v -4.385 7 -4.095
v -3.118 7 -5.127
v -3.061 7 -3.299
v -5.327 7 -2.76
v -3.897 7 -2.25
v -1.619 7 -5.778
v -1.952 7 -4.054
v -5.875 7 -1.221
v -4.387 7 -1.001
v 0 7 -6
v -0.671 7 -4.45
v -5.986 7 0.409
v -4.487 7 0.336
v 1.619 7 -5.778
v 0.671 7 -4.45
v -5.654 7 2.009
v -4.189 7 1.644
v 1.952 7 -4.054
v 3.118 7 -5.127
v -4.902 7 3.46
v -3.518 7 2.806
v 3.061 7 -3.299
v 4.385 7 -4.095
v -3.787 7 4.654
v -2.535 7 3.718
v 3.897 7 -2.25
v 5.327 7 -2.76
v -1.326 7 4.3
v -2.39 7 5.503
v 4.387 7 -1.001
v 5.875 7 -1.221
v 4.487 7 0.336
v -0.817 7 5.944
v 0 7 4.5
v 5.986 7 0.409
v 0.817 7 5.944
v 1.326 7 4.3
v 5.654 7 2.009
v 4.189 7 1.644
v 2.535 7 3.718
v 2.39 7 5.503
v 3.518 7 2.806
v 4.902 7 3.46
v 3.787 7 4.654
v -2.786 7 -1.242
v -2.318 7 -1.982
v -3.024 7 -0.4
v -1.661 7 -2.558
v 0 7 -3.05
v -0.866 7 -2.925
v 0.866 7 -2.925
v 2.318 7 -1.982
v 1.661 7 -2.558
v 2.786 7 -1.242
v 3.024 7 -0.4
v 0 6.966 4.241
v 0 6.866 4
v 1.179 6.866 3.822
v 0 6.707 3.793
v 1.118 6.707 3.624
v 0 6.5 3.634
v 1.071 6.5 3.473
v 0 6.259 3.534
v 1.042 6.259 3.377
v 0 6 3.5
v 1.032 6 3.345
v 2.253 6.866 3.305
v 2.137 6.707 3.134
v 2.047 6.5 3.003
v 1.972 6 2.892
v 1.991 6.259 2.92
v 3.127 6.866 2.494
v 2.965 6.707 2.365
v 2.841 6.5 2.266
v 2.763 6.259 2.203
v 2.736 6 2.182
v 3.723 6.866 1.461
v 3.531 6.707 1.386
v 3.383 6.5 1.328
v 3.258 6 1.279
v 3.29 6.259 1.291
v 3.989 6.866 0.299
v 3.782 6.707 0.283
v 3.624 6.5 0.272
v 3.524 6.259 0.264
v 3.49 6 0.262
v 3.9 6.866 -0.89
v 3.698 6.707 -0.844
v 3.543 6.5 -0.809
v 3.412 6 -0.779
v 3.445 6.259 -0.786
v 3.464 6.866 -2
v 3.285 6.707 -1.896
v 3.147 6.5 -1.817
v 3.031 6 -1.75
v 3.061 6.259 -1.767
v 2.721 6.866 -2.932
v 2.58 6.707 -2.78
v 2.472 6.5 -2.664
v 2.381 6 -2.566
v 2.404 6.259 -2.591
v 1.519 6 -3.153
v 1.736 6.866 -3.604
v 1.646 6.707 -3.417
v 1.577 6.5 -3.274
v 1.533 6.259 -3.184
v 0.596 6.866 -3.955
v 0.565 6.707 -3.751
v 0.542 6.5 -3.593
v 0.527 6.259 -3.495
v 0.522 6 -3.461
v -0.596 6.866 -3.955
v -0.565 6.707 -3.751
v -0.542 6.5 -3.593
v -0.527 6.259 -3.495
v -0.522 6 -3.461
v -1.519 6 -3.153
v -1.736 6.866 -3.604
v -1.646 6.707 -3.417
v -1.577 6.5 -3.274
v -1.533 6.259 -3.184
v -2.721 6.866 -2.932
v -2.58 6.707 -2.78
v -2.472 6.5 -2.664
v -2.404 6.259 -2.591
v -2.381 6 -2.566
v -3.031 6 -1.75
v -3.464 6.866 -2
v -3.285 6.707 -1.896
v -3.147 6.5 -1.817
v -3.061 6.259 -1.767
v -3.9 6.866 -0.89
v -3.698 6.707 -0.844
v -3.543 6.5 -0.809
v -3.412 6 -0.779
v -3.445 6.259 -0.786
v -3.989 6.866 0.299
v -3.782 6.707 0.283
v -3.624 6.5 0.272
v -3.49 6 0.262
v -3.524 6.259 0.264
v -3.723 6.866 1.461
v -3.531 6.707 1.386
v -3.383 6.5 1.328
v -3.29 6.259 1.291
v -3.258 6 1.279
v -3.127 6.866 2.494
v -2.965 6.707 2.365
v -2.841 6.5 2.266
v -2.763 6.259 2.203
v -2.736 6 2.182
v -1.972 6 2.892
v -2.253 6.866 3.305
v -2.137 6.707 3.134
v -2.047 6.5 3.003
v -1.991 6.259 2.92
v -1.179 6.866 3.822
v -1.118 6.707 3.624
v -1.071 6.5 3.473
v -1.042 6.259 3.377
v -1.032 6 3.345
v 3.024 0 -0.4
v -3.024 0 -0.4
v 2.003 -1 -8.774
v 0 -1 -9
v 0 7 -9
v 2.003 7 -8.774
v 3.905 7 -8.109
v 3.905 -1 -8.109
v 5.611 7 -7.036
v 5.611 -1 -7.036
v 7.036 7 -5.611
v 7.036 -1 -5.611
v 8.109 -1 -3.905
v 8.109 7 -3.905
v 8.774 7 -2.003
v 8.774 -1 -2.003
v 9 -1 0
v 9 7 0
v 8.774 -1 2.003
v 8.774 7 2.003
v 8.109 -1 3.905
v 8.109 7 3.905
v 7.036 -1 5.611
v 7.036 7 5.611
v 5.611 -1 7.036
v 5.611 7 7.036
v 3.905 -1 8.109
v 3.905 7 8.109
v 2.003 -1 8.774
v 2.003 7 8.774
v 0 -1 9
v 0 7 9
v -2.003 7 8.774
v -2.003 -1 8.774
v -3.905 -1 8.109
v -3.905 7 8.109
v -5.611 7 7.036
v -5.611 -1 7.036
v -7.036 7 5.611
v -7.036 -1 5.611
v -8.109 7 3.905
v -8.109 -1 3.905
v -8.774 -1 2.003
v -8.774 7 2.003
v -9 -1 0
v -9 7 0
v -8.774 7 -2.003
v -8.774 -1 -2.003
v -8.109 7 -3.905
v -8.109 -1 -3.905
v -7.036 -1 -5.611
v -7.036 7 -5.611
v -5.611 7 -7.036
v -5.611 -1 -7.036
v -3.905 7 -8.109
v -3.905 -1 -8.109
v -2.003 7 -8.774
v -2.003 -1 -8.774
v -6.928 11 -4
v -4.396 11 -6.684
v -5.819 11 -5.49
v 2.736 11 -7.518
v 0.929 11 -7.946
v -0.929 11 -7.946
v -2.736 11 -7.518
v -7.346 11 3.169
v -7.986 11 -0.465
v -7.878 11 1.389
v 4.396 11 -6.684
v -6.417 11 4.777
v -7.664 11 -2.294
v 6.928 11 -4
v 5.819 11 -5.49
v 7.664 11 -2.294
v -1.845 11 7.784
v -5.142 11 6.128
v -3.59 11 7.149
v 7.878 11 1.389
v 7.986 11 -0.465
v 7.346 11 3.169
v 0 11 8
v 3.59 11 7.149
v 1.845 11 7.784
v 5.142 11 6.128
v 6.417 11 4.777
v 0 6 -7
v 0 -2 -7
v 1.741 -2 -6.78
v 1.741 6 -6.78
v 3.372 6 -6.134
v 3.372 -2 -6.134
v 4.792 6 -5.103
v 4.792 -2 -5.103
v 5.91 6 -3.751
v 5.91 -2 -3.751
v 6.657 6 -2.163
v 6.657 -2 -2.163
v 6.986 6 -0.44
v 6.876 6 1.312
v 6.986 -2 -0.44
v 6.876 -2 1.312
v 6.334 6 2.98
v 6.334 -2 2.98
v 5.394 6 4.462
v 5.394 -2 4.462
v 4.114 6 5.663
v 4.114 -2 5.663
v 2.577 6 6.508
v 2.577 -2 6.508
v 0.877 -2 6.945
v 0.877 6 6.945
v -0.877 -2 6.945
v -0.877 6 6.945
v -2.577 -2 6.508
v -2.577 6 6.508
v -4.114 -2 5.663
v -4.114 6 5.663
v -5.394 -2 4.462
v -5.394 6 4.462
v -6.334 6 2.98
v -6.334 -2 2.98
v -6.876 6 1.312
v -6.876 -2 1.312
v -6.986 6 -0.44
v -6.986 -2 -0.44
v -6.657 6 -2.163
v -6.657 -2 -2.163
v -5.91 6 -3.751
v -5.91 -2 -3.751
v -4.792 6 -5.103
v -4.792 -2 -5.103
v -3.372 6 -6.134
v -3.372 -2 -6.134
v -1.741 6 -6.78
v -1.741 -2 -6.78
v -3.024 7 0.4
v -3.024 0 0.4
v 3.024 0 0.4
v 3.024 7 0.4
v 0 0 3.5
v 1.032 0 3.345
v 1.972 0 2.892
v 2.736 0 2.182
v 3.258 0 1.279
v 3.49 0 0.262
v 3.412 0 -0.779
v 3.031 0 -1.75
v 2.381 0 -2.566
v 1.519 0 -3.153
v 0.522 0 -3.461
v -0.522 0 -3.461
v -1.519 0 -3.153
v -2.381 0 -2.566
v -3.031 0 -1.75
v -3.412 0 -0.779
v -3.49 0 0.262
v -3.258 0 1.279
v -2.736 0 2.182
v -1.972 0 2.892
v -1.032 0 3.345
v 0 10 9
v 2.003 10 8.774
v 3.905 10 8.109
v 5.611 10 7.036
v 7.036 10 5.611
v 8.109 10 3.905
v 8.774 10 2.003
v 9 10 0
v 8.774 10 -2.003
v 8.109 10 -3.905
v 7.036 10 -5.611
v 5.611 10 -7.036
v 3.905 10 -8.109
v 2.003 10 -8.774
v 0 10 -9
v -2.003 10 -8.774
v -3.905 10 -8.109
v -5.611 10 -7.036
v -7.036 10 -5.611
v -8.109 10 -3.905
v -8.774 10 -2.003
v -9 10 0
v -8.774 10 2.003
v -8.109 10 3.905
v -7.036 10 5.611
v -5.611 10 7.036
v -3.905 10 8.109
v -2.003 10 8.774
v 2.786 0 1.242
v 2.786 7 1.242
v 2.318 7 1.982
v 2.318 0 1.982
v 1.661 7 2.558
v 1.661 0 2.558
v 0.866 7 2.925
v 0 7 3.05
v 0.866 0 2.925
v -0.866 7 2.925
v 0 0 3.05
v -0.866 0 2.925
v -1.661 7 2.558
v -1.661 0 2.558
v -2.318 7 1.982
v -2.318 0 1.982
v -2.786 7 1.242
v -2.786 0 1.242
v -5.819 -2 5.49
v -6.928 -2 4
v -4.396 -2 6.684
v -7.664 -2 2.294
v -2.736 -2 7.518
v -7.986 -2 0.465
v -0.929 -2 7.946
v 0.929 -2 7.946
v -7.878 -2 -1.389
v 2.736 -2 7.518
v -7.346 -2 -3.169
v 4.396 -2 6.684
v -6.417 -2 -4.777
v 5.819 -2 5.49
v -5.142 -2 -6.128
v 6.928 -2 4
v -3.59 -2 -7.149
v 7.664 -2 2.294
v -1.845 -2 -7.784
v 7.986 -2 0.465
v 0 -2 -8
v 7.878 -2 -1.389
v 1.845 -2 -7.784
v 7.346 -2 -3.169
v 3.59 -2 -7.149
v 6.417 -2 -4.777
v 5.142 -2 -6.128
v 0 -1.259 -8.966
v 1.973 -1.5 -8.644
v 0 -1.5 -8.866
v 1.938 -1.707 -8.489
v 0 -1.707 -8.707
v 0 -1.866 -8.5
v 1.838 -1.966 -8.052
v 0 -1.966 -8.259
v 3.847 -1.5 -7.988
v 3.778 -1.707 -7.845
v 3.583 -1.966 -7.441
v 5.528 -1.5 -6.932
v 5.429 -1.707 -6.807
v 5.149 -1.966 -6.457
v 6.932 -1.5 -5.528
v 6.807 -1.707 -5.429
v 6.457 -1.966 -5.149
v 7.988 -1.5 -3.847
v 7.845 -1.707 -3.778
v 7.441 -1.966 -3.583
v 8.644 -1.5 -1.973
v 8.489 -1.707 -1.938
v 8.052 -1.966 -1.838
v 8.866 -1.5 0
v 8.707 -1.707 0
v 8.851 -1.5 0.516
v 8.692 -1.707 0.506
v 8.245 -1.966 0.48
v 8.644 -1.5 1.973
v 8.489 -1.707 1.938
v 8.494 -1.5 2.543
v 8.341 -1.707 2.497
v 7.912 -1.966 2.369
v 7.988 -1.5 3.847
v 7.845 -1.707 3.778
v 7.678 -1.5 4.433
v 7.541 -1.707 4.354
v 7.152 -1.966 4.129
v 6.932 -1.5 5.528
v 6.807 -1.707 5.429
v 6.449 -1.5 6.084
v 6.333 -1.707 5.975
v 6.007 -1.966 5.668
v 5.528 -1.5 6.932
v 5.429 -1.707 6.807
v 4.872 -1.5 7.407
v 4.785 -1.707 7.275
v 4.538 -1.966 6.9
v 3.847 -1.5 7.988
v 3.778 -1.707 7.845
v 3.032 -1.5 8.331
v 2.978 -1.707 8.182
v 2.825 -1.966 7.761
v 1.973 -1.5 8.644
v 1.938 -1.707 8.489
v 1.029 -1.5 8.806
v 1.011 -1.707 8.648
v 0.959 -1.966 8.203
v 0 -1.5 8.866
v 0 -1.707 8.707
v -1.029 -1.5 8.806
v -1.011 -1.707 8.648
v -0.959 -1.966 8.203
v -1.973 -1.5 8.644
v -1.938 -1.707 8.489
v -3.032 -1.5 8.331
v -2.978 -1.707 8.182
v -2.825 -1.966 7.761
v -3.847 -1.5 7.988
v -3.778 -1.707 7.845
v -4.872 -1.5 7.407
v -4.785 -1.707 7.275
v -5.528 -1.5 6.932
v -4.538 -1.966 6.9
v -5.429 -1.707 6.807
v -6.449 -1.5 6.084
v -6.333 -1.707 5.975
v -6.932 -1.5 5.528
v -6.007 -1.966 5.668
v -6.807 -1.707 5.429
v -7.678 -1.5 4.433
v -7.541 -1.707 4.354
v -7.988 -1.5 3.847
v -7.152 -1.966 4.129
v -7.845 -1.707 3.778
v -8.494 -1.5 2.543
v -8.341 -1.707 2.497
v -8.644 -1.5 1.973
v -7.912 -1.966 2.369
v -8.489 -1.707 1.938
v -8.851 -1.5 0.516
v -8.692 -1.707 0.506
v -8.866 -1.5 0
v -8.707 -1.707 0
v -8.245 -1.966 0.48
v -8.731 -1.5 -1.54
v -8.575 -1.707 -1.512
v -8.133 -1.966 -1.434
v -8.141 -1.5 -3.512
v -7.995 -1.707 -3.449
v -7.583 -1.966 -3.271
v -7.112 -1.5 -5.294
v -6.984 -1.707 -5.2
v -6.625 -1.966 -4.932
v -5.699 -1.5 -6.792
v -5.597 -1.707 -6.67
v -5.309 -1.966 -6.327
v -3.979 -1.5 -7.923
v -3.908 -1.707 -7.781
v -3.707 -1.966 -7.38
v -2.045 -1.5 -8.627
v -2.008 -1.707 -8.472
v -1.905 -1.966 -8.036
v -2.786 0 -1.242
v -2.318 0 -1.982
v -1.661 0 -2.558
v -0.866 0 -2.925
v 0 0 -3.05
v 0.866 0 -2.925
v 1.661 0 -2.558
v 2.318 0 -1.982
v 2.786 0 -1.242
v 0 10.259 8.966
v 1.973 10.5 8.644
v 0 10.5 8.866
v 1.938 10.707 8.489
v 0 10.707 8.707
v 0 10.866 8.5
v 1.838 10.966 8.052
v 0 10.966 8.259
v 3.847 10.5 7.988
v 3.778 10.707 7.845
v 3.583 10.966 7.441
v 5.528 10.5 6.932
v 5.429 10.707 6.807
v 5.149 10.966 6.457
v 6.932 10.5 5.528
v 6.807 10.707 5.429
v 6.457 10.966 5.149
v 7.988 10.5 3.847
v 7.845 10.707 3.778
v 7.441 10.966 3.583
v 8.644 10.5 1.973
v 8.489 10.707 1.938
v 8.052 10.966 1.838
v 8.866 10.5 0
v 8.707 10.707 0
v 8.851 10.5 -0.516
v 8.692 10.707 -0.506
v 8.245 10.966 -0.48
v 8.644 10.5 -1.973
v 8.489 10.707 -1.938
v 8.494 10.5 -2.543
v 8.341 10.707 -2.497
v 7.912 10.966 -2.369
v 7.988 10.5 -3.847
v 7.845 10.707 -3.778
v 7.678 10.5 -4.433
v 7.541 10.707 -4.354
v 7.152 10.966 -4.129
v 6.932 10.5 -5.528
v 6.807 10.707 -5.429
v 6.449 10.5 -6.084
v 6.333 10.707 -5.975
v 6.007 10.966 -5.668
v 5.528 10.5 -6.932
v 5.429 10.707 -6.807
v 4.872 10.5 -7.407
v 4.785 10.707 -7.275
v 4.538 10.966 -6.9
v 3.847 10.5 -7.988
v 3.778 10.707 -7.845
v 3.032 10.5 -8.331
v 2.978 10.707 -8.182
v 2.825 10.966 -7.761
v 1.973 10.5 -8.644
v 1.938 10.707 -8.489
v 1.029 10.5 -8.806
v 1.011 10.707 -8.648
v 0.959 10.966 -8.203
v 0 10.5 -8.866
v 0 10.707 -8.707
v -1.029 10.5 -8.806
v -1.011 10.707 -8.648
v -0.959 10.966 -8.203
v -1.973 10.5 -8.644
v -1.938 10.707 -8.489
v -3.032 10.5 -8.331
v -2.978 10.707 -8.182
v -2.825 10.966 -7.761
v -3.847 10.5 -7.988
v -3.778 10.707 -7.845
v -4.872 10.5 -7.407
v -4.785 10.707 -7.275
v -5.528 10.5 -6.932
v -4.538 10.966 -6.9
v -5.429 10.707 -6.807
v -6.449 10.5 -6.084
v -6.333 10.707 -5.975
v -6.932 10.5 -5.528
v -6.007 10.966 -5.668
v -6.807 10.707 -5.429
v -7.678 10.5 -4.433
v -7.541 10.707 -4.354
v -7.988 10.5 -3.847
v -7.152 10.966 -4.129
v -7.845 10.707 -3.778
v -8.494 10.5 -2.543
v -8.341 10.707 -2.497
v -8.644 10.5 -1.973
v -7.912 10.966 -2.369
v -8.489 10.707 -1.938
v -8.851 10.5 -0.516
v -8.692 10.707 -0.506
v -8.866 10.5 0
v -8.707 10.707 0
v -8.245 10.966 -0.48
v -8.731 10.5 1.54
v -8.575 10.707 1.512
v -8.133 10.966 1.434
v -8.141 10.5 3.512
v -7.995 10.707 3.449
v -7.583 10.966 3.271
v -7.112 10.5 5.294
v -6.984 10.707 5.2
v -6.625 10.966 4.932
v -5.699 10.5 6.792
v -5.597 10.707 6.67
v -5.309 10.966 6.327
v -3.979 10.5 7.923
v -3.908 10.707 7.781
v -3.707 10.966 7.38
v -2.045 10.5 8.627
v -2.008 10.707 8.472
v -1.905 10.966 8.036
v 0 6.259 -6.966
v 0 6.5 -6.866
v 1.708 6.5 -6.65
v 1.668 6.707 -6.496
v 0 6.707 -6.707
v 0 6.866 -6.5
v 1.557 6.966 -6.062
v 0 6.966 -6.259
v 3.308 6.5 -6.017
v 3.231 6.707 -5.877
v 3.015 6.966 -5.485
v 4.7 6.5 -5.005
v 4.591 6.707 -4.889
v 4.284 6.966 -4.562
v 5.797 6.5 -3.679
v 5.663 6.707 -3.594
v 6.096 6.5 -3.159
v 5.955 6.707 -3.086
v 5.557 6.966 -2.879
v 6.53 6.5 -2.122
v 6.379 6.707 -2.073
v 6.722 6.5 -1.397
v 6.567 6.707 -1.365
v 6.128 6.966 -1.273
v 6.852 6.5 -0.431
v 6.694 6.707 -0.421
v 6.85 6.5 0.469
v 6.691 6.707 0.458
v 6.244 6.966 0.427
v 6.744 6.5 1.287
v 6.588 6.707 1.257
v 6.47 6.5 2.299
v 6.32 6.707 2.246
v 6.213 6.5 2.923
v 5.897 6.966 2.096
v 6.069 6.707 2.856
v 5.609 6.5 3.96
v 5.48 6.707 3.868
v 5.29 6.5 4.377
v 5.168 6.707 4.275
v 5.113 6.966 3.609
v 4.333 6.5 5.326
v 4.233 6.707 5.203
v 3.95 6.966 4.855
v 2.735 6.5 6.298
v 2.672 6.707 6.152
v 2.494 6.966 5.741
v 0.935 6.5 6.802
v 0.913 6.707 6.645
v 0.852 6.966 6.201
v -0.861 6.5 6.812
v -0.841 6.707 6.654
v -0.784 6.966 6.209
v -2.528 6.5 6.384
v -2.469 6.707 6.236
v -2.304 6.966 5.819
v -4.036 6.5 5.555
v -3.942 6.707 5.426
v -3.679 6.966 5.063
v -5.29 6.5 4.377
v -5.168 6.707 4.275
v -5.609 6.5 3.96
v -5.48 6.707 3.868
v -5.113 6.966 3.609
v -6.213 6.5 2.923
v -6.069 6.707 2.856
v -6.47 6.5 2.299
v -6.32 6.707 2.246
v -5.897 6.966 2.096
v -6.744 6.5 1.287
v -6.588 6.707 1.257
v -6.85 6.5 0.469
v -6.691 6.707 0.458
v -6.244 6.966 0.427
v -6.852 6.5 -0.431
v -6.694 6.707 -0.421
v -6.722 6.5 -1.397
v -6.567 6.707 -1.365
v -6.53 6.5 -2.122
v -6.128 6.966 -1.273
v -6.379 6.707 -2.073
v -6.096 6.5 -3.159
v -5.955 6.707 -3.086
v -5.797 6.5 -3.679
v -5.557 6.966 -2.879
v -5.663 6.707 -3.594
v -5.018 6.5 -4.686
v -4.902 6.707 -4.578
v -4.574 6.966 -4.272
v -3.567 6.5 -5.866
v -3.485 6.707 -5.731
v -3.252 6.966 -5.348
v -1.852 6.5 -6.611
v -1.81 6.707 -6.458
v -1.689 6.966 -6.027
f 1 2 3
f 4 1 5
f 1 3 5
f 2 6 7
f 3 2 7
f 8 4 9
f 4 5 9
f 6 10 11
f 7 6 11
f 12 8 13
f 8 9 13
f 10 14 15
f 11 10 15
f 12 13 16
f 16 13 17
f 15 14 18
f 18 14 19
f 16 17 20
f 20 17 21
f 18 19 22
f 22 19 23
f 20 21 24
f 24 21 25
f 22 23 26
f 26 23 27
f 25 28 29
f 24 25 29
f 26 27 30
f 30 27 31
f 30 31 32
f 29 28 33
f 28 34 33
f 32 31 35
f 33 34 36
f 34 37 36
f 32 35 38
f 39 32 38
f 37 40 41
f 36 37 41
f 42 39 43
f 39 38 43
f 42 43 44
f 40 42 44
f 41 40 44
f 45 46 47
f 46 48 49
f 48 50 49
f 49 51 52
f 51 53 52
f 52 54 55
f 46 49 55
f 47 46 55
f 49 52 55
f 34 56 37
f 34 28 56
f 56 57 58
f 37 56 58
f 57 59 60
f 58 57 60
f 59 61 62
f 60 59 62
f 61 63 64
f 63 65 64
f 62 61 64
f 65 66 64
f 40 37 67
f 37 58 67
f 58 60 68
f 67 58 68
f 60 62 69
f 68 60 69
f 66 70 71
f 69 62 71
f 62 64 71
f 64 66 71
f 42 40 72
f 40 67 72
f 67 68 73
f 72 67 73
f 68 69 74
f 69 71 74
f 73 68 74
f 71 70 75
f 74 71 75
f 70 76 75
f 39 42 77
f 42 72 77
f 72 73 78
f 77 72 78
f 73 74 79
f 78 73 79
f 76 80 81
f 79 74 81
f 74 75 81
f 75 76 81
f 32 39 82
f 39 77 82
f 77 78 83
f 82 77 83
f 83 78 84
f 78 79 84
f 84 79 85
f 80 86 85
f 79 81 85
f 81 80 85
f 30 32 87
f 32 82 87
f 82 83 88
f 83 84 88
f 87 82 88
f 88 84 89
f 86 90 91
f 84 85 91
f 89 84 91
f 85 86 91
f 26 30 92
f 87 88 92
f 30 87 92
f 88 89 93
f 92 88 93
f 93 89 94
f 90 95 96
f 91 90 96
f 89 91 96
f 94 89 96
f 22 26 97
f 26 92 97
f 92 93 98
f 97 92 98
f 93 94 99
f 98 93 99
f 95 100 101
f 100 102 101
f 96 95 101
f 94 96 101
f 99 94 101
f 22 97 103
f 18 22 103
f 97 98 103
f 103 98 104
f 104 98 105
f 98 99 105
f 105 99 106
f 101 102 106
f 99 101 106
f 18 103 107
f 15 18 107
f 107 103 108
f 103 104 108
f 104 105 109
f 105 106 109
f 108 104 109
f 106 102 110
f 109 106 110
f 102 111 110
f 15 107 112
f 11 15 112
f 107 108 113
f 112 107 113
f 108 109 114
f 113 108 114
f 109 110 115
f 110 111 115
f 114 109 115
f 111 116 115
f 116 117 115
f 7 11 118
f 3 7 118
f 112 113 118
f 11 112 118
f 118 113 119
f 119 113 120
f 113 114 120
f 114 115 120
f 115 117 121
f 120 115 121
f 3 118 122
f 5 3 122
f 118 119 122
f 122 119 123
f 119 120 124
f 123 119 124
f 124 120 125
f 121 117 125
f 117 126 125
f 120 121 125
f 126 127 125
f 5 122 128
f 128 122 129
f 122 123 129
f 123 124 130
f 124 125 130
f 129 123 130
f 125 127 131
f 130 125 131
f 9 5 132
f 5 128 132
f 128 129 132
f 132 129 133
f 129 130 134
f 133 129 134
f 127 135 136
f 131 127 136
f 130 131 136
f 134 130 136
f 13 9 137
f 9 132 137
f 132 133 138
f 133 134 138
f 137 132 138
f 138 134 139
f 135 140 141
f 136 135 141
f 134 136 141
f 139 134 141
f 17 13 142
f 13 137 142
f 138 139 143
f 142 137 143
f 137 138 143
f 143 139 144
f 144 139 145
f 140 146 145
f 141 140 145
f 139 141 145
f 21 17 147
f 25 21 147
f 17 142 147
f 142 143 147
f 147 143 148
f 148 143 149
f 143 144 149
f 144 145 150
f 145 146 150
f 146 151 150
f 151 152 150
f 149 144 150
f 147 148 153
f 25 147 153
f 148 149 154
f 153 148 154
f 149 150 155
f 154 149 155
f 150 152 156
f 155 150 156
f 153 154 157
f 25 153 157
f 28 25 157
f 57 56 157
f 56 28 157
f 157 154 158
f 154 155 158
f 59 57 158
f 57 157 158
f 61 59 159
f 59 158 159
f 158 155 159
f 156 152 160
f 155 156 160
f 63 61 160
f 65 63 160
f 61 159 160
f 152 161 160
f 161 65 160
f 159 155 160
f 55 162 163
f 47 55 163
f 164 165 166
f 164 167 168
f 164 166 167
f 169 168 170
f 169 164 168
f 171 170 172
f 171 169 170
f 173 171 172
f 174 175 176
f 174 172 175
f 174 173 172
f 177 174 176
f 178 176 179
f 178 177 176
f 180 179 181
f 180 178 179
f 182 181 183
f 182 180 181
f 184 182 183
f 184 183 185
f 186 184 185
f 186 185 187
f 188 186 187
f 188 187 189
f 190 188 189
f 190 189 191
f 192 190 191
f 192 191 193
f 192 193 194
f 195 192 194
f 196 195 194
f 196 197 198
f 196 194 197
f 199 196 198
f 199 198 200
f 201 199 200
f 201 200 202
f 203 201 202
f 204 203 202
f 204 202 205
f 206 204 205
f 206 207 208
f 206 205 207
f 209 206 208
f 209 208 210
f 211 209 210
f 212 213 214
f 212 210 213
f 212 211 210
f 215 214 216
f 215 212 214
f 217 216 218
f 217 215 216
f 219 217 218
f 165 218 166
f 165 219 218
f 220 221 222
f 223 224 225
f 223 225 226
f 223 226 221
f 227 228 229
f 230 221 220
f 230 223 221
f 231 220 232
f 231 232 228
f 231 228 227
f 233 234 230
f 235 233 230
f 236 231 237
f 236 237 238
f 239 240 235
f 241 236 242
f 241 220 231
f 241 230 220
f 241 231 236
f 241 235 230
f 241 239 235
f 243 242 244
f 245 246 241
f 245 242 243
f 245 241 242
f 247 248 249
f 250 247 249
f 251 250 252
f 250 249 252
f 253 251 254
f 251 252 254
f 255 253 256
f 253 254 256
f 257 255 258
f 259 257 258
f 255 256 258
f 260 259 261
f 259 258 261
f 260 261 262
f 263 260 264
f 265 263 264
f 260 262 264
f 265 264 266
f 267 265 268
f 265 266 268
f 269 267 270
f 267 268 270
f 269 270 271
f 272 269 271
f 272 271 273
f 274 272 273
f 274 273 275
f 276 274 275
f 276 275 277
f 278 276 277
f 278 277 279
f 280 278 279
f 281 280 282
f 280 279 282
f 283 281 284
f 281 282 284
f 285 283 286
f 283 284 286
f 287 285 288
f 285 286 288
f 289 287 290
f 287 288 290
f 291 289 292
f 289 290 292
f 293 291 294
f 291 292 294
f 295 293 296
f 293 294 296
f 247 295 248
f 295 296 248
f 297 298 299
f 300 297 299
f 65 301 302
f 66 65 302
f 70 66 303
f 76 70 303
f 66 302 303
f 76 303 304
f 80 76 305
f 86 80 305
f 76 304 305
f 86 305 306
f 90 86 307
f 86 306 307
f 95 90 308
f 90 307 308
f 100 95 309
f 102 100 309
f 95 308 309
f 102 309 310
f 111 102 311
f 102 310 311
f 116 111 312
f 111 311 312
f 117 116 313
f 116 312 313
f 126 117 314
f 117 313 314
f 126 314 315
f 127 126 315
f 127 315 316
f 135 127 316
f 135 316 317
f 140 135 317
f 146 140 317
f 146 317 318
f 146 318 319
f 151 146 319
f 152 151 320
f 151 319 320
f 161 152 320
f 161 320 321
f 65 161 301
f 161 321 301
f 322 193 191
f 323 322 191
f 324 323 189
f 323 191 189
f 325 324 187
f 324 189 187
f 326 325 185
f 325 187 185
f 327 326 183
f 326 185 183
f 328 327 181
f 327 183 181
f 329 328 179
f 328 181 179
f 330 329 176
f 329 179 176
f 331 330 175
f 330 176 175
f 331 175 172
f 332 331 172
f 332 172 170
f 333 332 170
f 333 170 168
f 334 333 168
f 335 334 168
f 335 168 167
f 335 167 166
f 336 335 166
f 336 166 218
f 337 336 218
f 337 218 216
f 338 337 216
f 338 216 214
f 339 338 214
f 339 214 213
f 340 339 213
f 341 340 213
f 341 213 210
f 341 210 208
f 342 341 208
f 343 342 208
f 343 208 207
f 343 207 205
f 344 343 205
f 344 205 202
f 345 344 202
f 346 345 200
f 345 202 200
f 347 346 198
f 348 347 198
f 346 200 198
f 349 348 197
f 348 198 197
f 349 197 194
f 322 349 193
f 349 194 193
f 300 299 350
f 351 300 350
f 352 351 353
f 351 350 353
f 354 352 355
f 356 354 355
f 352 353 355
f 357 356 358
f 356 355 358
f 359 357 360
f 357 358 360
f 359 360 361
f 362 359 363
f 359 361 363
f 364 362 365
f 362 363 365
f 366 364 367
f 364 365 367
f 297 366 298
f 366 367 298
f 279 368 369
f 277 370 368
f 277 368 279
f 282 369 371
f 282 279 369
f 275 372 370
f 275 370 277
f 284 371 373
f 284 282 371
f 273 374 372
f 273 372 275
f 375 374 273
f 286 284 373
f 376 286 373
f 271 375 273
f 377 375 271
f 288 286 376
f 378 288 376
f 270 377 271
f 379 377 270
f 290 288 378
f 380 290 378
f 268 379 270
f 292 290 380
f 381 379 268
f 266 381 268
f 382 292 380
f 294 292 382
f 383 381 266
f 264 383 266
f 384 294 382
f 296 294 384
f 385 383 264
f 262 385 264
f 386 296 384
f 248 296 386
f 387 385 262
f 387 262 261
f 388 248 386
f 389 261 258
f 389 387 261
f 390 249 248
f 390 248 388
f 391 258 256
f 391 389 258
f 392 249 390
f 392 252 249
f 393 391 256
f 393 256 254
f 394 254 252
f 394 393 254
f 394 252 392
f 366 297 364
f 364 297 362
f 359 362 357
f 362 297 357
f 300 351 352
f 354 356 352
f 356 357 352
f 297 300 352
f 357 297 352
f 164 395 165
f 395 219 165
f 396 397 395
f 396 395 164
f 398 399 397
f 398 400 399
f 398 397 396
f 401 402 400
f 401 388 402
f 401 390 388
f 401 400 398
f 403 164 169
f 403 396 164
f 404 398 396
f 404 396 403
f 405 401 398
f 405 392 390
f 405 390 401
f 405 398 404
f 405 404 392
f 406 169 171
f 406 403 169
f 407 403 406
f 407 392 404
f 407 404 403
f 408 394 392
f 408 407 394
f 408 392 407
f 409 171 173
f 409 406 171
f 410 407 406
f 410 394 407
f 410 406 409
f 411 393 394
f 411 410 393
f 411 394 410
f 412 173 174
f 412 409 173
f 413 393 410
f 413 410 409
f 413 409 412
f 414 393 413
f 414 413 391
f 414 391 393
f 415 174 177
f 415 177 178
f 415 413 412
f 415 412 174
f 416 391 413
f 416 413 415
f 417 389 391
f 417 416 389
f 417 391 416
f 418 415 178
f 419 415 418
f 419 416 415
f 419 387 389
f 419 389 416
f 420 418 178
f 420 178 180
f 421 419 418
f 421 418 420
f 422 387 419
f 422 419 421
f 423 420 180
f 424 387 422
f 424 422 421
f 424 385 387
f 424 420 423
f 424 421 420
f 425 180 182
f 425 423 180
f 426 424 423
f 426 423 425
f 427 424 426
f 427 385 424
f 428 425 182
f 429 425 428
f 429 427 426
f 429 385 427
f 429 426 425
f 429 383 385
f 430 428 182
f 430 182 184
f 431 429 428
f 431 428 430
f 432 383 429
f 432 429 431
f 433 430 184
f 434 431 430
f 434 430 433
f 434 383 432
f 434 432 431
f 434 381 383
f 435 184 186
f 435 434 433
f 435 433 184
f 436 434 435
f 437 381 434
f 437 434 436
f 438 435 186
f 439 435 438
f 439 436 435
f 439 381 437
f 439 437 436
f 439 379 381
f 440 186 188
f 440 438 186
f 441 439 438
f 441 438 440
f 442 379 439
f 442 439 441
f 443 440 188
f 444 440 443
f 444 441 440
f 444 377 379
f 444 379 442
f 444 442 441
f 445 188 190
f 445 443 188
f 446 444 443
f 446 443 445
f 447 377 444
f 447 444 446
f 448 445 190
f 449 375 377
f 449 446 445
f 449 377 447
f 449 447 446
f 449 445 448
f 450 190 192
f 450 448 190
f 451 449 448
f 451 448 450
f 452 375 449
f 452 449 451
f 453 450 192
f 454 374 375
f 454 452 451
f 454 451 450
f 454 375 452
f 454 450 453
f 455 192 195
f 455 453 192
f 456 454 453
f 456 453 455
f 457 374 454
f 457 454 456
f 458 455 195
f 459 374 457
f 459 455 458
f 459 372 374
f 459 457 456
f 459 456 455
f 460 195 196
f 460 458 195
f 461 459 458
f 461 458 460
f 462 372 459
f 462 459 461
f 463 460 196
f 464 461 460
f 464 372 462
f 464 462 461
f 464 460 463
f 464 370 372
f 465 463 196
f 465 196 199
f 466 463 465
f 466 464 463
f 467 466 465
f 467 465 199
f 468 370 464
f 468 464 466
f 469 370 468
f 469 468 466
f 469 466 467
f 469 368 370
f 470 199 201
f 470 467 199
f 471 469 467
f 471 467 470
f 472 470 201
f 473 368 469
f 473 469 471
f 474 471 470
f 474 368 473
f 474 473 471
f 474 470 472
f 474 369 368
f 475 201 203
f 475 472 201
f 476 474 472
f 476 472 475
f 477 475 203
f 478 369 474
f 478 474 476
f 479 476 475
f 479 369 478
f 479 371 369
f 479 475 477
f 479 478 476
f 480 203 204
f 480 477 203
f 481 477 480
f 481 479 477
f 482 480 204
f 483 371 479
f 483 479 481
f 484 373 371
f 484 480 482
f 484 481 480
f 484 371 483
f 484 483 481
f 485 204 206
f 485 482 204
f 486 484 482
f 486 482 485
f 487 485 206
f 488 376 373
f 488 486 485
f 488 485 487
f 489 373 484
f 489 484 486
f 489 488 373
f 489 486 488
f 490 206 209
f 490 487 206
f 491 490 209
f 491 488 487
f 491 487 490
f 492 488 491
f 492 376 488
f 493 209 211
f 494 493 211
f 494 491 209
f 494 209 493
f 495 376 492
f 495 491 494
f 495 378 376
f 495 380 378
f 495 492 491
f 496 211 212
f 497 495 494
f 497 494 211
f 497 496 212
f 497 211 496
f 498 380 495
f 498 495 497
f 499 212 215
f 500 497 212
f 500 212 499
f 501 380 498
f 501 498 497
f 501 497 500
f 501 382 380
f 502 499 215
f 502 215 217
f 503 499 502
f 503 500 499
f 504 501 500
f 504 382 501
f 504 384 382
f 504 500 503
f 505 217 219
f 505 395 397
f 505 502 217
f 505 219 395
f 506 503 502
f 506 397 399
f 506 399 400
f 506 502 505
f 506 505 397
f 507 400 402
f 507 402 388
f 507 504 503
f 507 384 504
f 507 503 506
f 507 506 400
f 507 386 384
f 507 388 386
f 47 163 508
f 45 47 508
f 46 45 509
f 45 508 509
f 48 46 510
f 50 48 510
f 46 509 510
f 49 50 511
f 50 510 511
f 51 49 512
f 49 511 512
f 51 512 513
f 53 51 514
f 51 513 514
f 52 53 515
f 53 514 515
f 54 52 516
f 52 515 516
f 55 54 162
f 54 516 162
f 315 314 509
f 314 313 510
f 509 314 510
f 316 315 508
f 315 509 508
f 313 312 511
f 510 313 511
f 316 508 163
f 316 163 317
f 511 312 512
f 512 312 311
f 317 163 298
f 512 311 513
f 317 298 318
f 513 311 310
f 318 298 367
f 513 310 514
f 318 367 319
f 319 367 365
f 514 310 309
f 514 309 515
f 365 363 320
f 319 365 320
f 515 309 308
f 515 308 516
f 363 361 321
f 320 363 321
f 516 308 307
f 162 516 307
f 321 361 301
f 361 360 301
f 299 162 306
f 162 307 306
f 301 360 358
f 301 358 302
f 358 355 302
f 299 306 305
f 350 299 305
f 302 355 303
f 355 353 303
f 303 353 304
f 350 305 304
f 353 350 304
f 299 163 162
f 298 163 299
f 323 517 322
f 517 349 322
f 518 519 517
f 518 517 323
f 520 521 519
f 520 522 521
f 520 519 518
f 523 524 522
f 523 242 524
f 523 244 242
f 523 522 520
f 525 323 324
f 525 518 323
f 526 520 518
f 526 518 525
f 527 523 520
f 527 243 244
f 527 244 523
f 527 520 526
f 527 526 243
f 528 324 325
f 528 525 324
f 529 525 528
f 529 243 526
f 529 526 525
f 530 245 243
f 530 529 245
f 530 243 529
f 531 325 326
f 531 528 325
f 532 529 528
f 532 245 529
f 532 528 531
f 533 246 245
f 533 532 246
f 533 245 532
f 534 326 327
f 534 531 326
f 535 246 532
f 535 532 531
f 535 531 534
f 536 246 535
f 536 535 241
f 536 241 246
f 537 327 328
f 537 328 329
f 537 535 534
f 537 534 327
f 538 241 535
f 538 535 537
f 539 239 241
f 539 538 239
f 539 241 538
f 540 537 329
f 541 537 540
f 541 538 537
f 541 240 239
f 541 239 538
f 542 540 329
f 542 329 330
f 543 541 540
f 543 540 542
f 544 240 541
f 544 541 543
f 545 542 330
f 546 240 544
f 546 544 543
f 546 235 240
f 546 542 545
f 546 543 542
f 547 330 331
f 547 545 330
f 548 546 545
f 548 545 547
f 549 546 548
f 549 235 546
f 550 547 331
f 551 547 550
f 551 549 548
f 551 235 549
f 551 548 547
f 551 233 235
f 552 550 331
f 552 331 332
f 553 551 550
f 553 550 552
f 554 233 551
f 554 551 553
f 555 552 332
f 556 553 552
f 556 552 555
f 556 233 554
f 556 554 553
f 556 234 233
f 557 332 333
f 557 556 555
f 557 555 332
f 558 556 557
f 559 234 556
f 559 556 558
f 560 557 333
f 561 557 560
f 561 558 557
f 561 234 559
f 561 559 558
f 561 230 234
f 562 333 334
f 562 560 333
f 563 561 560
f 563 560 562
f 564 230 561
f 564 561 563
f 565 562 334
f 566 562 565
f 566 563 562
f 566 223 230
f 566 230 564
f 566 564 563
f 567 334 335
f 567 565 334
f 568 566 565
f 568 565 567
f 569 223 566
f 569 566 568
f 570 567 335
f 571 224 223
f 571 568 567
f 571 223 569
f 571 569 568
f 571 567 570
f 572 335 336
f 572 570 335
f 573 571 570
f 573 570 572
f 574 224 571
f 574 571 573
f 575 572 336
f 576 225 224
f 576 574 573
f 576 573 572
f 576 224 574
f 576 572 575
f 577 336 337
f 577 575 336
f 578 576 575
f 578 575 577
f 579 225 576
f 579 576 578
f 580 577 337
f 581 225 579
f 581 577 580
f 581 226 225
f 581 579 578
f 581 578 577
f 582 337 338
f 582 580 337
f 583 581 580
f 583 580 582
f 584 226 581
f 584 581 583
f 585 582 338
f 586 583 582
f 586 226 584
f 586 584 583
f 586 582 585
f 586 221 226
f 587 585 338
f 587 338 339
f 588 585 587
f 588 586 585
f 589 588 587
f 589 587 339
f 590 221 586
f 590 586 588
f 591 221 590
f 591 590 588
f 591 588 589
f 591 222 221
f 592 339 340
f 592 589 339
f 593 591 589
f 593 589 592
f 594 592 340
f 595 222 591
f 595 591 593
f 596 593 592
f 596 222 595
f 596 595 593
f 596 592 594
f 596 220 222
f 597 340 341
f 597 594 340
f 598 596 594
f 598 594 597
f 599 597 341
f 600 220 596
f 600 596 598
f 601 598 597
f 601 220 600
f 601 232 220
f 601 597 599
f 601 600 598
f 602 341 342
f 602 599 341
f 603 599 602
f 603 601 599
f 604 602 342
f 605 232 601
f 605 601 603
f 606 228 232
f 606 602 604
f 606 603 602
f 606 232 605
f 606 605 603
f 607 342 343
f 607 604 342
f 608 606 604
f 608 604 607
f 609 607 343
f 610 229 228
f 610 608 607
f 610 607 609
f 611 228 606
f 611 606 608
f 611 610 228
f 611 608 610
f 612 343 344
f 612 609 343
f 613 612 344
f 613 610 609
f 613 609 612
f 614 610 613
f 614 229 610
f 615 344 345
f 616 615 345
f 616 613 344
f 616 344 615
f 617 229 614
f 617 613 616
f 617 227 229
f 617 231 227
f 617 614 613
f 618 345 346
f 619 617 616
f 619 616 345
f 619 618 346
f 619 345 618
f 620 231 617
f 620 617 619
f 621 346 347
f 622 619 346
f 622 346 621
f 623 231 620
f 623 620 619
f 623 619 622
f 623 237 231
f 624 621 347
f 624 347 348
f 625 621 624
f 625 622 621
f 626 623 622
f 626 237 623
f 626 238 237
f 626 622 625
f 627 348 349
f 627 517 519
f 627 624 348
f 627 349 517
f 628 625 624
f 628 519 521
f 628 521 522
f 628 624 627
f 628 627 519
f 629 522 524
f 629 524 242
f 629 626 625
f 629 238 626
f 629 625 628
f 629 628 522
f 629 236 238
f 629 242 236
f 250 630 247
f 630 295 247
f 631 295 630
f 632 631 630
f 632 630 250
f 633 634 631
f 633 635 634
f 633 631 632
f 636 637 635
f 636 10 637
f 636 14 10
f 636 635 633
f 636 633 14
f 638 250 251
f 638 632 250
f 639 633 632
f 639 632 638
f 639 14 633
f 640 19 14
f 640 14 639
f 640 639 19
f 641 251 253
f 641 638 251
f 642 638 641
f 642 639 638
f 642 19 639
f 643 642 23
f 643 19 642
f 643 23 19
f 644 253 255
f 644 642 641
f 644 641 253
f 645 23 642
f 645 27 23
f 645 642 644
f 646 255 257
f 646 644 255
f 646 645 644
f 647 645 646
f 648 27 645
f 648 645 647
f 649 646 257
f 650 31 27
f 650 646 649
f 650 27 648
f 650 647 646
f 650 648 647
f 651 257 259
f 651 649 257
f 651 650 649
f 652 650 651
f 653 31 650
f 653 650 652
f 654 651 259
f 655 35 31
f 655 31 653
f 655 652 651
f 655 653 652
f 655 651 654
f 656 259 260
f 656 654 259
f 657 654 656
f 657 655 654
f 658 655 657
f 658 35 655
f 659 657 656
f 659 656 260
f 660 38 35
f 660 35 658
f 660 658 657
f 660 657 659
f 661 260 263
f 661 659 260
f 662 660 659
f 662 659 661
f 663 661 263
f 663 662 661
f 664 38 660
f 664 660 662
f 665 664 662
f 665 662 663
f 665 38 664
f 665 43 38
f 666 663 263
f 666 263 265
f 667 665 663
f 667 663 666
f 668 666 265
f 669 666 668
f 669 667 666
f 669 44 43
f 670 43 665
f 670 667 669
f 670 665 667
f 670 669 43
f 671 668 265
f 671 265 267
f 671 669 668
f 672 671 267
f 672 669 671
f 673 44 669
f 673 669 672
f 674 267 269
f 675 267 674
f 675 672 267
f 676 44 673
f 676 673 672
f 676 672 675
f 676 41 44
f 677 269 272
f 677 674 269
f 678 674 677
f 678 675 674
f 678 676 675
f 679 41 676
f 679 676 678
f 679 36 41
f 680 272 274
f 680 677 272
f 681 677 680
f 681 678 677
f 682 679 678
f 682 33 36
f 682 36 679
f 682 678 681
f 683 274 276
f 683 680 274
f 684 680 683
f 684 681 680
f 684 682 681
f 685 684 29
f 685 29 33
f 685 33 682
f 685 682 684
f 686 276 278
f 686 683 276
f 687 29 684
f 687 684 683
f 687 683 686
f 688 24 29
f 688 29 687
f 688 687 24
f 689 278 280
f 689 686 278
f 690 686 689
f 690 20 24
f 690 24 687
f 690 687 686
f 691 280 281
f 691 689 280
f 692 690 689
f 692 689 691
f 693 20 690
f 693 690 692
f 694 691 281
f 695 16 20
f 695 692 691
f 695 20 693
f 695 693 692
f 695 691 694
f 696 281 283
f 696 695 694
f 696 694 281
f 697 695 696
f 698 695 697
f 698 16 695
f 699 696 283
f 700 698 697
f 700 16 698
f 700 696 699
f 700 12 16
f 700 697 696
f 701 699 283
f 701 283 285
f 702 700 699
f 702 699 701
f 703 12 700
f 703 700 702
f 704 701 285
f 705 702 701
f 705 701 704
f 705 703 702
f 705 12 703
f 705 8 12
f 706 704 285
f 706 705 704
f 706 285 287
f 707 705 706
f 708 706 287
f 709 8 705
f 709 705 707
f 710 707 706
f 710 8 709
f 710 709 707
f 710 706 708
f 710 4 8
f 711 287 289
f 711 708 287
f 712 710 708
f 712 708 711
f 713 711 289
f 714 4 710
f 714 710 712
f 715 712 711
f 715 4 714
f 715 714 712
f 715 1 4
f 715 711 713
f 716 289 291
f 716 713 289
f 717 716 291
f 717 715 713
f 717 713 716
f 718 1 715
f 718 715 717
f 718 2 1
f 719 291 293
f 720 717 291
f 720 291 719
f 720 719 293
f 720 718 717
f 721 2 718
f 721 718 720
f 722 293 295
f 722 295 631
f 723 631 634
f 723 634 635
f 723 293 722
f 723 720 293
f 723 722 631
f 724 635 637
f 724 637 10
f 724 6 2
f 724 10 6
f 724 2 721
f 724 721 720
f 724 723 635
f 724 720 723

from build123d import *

# Parameters (mm, degrees)
SKETCH1_R           = 3.5
BOSS_EXTRUDE1_DEPTH = 7
SKETCH2_R           = 9
BOSS_EXTRUDE2_DEPTH = 4
BOSS_EXTRUDE3_START = 9
SKETCH3_R           = 9
SKETCH3_R_2         = 7
BOSS_EXTRUDE3_DEPTH = 9
FILLET1_R           = 1


with BuildPart() as part:
    # Sketch1 → Boss-Extrude1 (new body)
    with BuildSketch(Plane(origin=(0, 0, 0), x_dir=(1, 0, 0), z_dir=(0, 1, 0))):
        with Locations(Location((0, 0, 0), (0, 0, 270))):
            Circle(SKETCH1_R)
        with BuildLine():
            Line((3.023656727, 0.4), (-3.023656727, 0.4))
            ThreePointArc((-3.023656727, 0.4), (0, 3.05), (3.023656727, 0.4))
        make_face(mode=Mode.SUBTRACT)
        with BuildLine():
            Line((-3.023656727, -0.4), (3.023656727, -0.4))
            ThreePointArc((3.023656727, -0.4), (0, -3.05), (-3.023656727, -0.4))
        make_face(mode=Mode.SUBTRACT)
    extrude(amount=BOSS_EXTRUDE1_DEPTH)

    # Sketch2 → Boss-Extrude2 (add)
    with BuildSketch(Plane(origin=(0, 7, 0), x_dir=(1, 0, 0), z_dir=(0, 1, 0))):
        with Locations(Location((0, 0, 0), (0, 0, 270))):
            Circle(SKETCH2_R)
    extrude(amount=BOSS_EXTRUDE2_DEPTH)

    # Sketch3 → Boss-Extrude3 (add)
    with BuildSketch(Plane.XZ.offset(-7).offset(BOSS_EXTRUDE3_START)):
        with Locations(Location((0, 0, 0), (0, 0, 270))):
            Circle(SKETCH3_R)
        with Locations(Location((0, 0, 0), (0, 0, 270))):
            Circle(SKETCH3_R_2, mode=Mode.SUBTRACT)
    extrude(amount=-BOSS_EXTRUDE3_DEPTH)

    # Fillet1
    fillet1_edges = [part.edges().sort_by_distance(p)[0] for p in [
        (0, 11, -9),
        (0, 7, -3.5),
        (0, -2, 9),
        (0, 7, 7),
    ]]
    fillet(fillet1_edges, radius=FILLET1_R)


solid = part.part
